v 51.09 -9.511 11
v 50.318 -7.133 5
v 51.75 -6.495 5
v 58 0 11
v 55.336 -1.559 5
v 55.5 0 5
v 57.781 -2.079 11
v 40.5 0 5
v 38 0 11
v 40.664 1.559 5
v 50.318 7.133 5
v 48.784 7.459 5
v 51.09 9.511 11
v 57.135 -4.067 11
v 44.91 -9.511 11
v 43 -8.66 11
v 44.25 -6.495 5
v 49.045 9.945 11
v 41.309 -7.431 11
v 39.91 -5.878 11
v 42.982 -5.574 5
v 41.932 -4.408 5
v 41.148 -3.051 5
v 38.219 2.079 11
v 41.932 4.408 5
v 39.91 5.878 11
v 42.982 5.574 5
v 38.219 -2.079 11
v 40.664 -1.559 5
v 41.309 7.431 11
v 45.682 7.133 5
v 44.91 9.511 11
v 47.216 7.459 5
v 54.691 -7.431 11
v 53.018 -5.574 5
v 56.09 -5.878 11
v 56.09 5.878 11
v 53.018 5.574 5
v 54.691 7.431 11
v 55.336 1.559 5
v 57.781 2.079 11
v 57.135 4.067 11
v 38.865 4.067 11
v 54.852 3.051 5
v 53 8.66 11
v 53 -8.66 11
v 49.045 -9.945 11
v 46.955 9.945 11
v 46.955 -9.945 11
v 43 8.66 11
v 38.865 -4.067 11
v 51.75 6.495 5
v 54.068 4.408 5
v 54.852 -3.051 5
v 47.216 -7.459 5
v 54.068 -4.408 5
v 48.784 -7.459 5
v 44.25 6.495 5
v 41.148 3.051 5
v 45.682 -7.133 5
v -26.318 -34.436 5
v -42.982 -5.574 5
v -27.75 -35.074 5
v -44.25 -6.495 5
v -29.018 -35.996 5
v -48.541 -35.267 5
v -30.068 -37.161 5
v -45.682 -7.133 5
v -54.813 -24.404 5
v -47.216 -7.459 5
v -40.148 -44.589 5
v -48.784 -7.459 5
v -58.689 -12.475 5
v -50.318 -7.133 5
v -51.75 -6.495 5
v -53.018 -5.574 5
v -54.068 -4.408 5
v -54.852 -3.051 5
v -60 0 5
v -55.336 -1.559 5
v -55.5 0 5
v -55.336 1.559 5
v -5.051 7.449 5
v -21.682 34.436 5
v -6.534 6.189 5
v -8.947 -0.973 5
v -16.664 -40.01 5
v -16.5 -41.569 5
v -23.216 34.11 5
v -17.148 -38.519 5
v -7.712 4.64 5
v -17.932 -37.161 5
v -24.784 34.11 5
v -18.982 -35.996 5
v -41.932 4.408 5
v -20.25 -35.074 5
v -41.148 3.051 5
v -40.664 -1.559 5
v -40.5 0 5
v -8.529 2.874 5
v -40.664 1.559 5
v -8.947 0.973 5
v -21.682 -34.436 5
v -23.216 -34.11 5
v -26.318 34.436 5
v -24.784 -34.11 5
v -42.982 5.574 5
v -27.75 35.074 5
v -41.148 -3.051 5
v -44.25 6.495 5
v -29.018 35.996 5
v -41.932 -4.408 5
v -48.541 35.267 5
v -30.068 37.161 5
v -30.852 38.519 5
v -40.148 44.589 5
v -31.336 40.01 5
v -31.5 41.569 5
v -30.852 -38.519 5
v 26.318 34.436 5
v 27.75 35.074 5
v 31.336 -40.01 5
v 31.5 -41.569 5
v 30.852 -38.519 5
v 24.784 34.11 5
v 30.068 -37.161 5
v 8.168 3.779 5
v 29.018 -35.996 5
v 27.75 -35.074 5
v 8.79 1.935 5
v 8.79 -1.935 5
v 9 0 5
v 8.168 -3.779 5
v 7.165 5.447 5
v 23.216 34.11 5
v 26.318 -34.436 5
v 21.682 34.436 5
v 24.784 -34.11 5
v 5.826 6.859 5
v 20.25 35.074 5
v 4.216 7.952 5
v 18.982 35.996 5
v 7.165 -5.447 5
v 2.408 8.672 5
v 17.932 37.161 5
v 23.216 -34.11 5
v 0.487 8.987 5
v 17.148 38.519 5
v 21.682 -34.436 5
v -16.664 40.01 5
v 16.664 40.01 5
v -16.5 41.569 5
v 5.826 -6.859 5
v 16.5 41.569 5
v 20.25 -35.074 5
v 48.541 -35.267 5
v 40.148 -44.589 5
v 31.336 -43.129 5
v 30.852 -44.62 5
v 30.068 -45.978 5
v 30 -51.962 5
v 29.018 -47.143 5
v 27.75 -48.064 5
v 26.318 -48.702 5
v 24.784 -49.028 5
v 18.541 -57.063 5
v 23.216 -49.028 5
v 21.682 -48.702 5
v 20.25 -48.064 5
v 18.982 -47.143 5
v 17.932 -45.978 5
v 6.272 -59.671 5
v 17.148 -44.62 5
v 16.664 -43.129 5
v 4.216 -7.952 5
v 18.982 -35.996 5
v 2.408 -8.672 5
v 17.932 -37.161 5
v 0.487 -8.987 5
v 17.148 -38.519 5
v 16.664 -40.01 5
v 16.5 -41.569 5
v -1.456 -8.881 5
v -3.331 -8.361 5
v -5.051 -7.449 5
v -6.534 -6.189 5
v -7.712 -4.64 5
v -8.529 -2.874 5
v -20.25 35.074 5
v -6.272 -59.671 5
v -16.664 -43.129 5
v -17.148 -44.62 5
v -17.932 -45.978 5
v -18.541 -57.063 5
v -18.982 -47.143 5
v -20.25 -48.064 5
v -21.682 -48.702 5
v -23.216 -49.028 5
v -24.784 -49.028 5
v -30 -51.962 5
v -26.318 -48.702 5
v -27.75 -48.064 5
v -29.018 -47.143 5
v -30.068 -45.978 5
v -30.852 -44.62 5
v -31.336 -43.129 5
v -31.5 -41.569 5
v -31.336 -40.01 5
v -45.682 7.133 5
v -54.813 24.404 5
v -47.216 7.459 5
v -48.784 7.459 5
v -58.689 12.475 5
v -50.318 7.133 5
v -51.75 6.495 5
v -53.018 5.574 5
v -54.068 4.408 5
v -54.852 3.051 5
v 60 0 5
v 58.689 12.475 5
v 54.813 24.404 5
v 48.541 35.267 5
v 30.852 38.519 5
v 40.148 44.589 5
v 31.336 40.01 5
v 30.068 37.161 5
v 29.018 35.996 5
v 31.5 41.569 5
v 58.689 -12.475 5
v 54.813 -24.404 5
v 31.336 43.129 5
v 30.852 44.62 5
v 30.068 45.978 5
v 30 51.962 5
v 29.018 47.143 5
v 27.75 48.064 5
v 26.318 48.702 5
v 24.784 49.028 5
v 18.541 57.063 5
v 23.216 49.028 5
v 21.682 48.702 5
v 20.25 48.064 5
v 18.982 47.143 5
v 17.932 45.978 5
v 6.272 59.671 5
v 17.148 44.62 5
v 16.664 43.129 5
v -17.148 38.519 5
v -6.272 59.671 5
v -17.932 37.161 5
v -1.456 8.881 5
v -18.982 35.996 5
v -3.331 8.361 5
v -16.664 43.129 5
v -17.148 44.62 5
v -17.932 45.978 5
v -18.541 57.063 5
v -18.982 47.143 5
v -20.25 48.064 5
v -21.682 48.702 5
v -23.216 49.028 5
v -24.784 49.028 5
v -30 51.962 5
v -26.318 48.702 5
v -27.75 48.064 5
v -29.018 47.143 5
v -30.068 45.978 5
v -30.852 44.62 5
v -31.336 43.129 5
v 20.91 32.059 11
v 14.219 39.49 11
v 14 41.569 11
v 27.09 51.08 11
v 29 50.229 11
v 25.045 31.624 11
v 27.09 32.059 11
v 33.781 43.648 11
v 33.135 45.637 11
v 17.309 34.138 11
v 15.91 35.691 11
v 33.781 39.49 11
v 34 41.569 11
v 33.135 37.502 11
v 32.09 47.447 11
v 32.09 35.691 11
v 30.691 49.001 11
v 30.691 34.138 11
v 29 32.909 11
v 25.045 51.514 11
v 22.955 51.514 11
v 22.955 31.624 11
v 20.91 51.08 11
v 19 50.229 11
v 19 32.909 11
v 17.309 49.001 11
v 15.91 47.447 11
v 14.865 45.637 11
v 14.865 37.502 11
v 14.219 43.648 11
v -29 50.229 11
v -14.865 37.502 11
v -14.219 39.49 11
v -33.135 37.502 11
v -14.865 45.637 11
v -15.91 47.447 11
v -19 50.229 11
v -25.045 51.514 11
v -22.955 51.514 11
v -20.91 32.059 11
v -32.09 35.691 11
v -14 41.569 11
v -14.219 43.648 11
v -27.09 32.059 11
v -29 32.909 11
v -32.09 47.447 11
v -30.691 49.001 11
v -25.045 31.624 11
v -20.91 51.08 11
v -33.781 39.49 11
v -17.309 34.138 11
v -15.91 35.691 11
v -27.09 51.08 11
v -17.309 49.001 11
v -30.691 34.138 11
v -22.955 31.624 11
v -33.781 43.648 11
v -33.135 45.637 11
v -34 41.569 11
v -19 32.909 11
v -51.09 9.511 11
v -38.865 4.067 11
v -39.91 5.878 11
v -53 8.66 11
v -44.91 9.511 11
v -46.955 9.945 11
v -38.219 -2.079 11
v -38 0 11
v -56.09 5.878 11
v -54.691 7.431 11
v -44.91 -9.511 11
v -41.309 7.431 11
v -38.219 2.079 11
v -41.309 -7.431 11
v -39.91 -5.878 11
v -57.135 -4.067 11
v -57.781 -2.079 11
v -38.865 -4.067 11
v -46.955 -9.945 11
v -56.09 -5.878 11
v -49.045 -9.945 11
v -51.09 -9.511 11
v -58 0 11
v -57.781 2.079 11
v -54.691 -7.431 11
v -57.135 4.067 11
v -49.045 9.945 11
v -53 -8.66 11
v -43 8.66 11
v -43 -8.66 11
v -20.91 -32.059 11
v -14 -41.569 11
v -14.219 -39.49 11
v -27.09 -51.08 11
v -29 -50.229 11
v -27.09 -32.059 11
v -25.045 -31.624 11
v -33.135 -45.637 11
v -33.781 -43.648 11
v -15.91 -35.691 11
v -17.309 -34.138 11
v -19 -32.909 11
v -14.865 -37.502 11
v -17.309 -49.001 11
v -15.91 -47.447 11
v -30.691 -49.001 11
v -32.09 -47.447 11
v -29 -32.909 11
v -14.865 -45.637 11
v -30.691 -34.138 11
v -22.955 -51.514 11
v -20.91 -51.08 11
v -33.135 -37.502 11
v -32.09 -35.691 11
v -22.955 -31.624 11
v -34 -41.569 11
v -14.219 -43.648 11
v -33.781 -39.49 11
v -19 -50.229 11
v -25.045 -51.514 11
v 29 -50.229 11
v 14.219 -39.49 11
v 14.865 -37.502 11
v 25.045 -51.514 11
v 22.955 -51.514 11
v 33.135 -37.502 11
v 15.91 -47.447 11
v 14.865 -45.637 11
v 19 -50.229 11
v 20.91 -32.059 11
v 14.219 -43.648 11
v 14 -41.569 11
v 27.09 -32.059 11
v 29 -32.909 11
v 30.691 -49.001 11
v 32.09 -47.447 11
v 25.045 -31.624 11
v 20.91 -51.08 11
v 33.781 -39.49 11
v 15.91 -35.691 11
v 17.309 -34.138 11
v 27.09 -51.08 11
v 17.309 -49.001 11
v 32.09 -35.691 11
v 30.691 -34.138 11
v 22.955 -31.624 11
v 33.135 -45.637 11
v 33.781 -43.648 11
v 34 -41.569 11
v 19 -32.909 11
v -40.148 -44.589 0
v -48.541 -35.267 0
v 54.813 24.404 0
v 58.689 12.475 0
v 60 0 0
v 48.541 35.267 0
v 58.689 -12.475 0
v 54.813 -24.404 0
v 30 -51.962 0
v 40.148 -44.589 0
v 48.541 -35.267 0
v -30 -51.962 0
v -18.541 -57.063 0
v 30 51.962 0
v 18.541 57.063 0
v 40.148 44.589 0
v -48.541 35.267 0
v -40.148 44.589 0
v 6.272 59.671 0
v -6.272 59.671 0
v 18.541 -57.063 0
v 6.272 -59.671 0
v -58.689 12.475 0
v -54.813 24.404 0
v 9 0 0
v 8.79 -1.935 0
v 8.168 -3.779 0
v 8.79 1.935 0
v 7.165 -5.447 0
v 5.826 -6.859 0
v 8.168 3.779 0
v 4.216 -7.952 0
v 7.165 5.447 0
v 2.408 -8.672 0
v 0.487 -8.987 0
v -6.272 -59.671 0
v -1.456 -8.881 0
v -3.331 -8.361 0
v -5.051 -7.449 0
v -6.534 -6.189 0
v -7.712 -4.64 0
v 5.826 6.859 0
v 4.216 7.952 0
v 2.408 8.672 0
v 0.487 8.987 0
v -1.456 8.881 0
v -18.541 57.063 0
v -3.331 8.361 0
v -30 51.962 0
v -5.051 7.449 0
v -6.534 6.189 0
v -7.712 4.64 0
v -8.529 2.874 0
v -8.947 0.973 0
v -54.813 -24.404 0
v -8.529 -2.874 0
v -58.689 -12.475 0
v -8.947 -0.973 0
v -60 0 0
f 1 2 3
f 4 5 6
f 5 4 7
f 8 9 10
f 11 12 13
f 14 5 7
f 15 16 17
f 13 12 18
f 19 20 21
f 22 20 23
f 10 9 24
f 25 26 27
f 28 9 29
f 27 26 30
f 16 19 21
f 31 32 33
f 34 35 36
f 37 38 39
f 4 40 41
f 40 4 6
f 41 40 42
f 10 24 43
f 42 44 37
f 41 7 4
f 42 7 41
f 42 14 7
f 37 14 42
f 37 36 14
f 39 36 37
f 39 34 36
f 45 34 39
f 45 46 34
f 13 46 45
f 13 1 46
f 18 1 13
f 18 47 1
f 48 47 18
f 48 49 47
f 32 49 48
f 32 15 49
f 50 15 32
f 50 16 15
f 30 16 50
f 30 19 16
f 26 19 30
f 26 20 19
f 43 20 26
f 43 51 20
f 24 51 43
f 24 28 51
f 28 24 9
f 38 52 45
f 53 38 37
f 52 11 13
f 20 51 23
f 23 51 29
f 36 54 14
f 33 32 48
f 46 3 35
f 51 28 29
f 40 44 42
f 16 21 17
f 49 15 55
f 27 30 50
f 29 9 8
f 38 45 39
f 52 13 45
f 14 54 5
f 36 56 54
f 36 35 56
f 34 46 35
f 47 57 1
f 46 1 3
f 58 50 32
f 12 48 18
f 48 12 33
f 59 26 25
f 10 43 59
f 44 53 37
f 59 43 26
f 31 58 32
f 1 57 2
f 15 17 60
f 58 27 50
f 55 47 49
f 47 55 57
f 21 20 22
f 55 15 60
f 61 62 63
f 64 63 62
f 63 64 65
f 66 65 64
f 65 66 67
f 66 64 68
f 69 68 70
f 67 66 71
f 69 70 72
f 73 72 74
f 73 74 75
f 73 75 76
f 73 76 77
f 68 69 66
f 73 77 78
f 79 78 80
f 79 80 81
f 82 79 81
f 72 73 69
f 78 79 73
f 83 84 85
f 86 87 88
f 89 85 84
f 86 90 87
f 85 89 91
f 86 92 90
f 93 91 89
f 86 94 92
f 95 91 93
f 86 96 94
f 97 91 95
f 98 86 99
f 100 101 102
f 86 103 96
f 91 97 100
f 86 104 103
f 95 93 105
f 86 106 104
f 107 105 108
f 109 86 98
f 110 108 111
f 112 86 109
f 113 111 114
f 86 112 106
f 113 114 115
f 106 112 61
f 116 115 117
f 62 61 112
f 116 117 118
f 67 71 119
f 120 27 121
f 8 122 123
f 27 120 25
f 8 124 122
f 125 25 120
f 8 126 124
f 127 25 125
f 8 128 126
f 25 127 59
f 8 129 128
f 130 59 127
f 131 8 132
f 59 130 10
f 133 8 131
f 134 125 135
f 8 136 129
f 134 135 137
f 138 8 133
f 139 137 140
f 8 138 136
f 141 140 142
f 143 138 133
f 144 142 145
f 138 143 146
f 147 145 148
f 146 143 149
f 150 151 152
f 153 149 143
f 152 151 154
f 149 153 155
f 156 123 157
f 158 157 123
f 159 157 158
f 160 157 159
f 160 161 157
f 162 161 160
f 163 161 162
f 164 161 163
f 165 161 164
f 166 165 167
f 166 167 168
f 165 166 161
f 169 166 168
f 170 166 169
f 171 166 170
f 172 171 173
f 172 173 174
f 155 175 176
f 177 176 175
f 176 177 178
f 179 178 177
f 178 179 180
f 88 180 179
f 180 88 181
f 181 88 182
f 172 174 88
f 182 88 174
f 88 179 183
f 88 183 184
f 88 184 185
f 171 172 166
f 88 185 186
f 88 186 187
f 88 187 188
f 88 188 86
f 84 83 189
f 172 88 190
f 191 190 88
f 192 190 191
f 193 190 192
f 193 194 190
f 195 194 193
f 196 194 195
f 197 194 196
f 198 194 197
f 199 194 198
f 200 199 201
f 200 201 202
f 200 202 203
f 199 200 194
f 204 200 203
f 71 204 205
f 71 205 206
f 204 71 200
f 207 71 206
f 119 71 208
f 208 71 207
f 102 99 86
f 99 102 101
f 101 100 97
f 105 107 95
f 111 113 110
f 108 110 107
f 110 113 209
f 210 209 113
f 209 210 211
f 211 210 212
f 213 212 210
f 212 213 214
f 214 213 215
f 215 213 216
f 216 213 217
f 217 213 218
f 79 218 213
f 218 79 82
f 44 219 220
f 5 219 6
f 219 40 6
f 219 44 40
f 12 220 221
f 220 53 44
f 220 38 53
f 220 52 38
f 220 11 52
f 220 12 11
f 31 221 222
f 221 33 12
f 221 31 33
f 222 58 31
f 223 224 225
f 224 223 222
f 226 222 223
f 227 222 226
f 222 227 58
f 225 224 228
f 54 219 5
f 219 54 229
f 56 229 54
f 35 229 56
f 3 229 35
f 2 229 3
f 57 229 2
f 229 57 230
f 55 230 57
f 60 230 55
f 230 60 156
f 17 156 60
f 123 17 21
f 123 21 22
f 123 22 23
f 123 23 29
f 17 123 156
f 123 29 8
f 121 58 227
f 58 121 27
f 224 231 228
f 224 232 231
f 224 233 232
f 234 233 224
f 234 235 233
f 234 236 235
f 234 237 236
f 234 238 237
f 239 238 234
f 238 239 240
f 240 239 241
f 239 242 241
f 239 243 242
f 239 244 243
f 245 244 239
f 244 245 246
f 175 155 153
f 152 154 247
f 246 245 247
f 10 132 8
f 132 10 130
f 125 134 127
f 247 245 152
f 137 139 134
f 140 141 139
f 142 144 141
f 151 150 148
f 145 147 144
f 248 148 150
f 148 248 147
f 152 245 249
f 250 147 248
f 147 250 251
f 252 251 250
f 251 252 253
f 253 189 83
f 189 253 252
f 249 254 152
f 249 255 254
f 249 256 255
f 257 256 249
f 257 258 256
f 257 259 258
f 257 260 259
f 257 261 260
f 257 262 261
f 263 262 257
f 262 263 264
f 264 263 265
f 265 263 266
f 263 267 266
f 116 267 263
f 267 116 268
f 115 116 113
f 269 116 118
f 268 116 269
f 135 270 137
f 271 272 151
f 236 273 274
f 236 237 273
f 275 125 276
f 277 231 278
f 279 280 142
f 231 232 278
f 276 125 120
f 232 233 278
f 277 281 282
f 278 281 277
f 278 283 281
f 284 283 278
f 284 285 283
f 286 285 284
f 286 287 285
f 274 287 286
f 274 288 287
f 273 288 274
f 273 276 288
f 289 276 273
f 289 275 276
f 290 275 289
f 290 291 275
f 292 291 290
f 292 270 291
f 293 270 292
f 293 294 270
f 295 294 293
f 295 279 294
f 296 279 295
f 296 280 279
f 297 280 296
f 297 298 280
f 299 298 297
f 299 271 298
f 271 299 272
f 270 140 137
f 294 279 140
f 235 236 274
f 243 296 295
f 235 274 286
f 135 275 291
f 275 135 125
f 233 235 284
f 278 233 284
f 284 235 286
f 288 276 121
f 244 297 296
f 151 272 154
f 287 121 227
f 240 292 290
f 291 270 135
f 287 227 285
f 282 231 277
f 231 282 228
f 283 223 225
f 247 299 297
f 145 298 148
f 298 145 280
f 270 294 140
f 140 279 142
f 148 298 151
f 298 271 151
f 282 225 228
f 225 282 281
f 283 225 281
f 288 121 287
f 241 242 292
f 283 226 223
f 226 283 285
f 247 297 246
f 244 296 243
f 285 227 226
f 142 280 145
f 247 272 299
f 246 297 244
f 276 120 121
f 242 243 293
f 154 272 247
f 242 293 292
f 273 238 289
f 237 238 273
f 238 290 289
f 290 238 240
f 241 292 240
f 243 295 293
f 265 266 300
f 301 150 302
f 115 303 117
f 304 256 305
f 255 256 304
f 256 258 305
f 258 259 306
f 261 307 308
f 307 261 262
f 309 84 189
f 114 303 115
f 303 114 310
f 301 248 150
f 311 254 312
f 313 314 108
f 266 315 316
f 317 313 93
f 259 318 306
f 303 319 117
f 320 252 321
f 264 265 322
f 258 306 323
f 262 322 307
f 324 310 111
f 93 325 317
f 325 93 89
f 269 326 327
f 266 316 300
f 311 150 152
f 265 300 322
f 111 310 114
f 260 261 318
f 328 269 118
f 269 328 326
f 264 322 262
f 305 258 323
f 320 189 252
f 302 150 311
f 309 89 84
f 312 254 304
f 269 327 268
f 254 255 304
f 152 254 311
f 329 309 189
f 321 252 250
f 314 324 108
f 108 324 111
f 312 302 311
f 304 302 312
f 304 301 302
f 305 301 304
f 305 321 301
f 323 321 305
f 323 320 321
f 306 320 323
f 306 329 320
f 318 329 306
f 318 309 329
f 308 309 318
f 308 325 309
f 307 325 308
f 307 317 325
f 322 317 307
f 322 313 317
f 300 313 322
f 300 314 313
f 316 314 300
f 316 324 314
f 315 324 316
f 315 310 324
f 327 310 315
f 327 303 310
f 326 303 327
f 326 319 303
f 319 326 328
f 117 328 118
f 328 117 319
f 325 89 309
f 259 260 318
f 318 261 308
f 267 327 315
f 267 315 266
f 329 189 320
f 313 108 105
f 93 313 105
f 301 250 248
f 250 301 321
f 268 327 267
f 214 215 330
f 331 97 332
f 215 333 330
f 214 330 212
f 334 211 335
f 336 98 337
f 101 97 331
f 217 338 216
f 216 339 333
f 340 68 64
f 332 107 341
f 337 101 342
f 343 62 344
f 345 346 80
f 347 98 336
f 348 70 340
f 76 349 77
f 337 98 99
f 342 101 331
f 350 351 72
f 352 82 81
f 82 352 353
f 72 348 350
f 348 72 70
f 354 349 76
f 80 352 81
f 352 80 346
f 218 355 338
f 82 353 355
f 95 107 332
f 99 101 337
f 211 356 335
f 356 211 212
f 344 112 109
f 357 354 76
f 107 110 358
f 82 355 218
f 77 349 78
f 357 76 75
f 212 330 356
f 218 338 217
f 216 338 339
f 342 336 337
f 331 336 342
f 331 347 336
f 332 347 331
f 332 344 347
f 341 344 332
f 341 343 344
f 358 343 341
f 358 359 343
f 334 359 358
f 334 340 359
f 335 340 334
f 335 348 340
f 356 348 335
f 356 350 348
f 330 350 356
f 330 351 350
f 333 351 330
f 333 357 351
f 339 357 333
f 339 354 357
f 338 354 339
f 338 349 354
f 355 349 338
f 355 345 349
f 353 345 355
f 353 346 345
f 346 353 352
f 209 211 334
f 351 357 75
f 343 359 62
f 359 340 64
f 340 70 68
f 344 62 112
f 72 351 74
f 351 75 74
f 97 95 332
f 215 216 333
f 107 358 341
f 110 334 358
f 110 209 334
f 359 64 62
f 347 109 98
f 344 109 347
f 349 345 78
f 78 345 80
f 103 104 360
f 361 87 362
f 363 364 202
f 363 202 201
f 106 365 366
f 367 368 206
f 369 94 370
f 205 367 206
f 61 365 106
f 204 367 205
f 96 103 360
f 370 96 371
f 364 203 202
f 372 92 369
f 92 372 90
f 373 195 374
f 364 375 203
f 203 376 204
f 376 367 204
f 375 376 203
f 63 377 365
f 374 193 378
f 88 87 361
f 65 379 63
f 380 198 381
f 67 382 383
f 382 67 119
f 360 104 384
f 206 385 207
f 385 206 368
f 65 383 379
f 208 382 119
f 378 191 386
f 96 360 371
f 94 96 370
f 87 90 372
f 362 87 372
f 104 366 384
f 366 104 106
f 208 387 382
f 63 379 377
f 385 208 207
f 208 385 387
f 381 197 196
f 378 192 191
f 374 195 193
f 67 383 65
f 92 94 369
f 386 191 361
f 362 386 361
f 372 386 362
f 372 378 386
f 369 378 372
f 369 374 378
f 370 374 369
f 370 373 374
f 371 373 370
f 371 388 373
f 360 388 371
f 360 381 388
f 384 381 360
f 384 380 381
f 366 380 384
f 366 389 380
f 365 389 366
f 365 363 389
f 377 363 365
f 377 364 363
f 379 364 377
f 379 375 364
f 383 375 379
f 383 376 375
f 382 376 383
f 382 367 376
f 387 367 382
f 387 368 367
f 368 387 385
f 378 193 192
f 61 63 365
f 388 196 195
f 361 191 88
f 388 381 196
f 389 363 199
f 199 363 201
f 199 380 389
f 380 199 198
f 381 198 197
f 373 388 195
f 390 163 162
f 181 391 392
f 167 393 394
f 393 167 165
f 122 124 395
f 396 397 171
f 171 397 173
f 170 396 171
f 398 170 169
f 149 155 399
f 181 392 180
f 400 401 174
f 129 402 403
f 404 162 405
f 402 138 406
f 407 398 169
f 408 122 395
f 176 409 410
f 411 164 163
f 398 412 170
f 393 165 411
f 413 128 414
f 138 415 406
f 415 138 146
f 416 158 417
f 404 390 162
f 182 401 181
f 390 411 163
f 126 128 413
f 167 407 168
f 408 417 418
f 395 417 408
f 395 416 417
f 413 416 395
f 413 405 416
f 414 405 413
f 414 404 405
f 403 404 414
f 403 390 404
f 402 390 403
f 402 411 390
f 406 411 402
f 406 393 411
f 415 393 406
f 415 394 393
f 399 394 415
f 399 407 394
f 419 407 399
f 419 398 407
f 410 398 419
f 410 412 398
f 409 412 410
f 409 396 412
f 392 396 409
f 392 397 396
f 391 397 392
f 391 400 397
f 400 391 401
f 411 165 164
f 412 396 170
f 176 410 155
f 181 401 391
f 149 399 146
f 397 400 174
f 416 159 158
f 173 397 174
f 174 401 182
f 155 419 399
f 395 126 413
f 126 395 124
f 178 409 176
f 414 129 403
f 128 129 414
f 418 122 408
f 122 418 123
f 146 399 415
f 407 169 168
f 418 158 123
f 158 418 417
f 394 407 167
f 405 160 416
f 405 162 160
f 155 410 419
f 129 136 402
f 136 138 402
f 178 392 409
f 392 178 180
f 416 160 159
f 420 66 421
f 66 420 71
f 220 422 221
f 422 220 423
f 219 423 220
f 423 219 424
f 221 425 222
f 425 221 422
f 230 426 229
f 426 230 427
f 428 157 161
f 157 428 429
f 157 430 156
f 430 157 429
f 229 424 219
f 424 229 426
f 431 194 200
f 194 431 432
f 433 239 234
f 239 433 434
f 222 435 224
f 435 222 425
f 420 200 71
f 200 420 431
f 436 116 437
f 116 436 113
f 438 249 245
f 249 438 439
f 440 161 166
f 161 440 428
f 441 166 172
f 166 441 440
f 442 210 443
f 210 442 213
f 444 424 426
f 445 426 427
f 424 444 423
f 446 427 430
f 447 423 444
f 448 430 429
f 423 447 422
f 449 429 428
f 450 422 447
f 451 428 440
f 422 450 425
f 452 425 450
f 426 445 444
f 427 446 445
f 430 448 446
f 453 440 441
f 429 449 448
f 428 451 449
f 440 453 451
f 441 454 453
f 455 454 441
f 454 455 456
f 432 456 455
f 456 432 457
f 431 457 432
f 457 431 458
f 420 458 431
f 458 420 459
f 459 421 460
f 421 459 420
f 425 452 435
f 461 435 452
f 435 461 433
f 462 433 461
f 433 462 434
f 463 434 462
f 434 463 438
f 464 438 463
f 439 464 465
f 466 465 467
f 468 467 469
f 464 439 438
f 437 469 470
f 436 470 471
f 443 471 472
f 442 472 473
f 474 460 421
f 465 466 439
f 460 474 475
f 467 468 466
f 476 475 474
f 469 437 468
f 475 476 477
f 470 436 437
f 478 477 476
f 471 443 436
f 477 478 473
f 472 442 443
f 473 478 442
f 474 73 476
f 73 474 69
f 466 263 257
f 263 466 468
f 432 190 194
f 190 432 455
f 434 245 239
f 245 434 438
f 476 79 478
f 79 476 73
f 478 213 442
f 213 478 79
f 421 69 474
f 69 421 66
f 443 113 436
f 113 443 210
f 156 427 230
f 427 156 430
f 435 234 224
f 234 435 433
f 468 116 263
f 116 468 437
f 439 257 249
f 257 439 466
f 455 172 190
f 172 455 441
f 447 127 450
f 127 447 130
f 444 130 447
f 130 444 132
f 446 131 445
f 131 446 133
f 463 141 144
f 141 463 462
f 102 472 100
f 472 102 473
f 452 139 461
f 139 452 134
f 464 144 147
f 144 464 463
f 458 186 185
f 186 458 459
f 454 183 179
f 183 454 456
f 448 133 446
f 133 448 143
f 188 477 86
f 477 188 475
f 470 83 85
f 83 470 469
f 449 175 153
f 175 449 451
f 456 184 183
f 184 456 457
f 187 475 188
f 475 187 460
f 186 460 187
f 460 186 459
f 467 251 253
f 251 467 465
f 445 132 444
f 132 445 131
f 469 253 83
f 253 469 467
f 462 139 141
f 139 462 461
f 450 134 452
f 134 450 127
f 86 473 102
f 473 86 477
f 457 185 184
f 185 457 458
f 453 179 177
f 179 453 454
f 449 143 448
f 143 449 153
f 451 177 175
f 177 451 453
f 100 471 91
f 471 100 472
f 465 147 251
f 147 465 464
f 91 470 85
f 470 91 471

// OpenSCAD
%cube([40,60,80]);
s1=1.5;

difference(){
union(){		
	cylinder(5,s1*40,s1*40);
				
	for(i=[0:5]){
	rotate([0,0,i*60]) translate([s1*32,0,5]) cylinder(6,7.5,10);
				}
}

cylinder(150,9,9);
}		

	
